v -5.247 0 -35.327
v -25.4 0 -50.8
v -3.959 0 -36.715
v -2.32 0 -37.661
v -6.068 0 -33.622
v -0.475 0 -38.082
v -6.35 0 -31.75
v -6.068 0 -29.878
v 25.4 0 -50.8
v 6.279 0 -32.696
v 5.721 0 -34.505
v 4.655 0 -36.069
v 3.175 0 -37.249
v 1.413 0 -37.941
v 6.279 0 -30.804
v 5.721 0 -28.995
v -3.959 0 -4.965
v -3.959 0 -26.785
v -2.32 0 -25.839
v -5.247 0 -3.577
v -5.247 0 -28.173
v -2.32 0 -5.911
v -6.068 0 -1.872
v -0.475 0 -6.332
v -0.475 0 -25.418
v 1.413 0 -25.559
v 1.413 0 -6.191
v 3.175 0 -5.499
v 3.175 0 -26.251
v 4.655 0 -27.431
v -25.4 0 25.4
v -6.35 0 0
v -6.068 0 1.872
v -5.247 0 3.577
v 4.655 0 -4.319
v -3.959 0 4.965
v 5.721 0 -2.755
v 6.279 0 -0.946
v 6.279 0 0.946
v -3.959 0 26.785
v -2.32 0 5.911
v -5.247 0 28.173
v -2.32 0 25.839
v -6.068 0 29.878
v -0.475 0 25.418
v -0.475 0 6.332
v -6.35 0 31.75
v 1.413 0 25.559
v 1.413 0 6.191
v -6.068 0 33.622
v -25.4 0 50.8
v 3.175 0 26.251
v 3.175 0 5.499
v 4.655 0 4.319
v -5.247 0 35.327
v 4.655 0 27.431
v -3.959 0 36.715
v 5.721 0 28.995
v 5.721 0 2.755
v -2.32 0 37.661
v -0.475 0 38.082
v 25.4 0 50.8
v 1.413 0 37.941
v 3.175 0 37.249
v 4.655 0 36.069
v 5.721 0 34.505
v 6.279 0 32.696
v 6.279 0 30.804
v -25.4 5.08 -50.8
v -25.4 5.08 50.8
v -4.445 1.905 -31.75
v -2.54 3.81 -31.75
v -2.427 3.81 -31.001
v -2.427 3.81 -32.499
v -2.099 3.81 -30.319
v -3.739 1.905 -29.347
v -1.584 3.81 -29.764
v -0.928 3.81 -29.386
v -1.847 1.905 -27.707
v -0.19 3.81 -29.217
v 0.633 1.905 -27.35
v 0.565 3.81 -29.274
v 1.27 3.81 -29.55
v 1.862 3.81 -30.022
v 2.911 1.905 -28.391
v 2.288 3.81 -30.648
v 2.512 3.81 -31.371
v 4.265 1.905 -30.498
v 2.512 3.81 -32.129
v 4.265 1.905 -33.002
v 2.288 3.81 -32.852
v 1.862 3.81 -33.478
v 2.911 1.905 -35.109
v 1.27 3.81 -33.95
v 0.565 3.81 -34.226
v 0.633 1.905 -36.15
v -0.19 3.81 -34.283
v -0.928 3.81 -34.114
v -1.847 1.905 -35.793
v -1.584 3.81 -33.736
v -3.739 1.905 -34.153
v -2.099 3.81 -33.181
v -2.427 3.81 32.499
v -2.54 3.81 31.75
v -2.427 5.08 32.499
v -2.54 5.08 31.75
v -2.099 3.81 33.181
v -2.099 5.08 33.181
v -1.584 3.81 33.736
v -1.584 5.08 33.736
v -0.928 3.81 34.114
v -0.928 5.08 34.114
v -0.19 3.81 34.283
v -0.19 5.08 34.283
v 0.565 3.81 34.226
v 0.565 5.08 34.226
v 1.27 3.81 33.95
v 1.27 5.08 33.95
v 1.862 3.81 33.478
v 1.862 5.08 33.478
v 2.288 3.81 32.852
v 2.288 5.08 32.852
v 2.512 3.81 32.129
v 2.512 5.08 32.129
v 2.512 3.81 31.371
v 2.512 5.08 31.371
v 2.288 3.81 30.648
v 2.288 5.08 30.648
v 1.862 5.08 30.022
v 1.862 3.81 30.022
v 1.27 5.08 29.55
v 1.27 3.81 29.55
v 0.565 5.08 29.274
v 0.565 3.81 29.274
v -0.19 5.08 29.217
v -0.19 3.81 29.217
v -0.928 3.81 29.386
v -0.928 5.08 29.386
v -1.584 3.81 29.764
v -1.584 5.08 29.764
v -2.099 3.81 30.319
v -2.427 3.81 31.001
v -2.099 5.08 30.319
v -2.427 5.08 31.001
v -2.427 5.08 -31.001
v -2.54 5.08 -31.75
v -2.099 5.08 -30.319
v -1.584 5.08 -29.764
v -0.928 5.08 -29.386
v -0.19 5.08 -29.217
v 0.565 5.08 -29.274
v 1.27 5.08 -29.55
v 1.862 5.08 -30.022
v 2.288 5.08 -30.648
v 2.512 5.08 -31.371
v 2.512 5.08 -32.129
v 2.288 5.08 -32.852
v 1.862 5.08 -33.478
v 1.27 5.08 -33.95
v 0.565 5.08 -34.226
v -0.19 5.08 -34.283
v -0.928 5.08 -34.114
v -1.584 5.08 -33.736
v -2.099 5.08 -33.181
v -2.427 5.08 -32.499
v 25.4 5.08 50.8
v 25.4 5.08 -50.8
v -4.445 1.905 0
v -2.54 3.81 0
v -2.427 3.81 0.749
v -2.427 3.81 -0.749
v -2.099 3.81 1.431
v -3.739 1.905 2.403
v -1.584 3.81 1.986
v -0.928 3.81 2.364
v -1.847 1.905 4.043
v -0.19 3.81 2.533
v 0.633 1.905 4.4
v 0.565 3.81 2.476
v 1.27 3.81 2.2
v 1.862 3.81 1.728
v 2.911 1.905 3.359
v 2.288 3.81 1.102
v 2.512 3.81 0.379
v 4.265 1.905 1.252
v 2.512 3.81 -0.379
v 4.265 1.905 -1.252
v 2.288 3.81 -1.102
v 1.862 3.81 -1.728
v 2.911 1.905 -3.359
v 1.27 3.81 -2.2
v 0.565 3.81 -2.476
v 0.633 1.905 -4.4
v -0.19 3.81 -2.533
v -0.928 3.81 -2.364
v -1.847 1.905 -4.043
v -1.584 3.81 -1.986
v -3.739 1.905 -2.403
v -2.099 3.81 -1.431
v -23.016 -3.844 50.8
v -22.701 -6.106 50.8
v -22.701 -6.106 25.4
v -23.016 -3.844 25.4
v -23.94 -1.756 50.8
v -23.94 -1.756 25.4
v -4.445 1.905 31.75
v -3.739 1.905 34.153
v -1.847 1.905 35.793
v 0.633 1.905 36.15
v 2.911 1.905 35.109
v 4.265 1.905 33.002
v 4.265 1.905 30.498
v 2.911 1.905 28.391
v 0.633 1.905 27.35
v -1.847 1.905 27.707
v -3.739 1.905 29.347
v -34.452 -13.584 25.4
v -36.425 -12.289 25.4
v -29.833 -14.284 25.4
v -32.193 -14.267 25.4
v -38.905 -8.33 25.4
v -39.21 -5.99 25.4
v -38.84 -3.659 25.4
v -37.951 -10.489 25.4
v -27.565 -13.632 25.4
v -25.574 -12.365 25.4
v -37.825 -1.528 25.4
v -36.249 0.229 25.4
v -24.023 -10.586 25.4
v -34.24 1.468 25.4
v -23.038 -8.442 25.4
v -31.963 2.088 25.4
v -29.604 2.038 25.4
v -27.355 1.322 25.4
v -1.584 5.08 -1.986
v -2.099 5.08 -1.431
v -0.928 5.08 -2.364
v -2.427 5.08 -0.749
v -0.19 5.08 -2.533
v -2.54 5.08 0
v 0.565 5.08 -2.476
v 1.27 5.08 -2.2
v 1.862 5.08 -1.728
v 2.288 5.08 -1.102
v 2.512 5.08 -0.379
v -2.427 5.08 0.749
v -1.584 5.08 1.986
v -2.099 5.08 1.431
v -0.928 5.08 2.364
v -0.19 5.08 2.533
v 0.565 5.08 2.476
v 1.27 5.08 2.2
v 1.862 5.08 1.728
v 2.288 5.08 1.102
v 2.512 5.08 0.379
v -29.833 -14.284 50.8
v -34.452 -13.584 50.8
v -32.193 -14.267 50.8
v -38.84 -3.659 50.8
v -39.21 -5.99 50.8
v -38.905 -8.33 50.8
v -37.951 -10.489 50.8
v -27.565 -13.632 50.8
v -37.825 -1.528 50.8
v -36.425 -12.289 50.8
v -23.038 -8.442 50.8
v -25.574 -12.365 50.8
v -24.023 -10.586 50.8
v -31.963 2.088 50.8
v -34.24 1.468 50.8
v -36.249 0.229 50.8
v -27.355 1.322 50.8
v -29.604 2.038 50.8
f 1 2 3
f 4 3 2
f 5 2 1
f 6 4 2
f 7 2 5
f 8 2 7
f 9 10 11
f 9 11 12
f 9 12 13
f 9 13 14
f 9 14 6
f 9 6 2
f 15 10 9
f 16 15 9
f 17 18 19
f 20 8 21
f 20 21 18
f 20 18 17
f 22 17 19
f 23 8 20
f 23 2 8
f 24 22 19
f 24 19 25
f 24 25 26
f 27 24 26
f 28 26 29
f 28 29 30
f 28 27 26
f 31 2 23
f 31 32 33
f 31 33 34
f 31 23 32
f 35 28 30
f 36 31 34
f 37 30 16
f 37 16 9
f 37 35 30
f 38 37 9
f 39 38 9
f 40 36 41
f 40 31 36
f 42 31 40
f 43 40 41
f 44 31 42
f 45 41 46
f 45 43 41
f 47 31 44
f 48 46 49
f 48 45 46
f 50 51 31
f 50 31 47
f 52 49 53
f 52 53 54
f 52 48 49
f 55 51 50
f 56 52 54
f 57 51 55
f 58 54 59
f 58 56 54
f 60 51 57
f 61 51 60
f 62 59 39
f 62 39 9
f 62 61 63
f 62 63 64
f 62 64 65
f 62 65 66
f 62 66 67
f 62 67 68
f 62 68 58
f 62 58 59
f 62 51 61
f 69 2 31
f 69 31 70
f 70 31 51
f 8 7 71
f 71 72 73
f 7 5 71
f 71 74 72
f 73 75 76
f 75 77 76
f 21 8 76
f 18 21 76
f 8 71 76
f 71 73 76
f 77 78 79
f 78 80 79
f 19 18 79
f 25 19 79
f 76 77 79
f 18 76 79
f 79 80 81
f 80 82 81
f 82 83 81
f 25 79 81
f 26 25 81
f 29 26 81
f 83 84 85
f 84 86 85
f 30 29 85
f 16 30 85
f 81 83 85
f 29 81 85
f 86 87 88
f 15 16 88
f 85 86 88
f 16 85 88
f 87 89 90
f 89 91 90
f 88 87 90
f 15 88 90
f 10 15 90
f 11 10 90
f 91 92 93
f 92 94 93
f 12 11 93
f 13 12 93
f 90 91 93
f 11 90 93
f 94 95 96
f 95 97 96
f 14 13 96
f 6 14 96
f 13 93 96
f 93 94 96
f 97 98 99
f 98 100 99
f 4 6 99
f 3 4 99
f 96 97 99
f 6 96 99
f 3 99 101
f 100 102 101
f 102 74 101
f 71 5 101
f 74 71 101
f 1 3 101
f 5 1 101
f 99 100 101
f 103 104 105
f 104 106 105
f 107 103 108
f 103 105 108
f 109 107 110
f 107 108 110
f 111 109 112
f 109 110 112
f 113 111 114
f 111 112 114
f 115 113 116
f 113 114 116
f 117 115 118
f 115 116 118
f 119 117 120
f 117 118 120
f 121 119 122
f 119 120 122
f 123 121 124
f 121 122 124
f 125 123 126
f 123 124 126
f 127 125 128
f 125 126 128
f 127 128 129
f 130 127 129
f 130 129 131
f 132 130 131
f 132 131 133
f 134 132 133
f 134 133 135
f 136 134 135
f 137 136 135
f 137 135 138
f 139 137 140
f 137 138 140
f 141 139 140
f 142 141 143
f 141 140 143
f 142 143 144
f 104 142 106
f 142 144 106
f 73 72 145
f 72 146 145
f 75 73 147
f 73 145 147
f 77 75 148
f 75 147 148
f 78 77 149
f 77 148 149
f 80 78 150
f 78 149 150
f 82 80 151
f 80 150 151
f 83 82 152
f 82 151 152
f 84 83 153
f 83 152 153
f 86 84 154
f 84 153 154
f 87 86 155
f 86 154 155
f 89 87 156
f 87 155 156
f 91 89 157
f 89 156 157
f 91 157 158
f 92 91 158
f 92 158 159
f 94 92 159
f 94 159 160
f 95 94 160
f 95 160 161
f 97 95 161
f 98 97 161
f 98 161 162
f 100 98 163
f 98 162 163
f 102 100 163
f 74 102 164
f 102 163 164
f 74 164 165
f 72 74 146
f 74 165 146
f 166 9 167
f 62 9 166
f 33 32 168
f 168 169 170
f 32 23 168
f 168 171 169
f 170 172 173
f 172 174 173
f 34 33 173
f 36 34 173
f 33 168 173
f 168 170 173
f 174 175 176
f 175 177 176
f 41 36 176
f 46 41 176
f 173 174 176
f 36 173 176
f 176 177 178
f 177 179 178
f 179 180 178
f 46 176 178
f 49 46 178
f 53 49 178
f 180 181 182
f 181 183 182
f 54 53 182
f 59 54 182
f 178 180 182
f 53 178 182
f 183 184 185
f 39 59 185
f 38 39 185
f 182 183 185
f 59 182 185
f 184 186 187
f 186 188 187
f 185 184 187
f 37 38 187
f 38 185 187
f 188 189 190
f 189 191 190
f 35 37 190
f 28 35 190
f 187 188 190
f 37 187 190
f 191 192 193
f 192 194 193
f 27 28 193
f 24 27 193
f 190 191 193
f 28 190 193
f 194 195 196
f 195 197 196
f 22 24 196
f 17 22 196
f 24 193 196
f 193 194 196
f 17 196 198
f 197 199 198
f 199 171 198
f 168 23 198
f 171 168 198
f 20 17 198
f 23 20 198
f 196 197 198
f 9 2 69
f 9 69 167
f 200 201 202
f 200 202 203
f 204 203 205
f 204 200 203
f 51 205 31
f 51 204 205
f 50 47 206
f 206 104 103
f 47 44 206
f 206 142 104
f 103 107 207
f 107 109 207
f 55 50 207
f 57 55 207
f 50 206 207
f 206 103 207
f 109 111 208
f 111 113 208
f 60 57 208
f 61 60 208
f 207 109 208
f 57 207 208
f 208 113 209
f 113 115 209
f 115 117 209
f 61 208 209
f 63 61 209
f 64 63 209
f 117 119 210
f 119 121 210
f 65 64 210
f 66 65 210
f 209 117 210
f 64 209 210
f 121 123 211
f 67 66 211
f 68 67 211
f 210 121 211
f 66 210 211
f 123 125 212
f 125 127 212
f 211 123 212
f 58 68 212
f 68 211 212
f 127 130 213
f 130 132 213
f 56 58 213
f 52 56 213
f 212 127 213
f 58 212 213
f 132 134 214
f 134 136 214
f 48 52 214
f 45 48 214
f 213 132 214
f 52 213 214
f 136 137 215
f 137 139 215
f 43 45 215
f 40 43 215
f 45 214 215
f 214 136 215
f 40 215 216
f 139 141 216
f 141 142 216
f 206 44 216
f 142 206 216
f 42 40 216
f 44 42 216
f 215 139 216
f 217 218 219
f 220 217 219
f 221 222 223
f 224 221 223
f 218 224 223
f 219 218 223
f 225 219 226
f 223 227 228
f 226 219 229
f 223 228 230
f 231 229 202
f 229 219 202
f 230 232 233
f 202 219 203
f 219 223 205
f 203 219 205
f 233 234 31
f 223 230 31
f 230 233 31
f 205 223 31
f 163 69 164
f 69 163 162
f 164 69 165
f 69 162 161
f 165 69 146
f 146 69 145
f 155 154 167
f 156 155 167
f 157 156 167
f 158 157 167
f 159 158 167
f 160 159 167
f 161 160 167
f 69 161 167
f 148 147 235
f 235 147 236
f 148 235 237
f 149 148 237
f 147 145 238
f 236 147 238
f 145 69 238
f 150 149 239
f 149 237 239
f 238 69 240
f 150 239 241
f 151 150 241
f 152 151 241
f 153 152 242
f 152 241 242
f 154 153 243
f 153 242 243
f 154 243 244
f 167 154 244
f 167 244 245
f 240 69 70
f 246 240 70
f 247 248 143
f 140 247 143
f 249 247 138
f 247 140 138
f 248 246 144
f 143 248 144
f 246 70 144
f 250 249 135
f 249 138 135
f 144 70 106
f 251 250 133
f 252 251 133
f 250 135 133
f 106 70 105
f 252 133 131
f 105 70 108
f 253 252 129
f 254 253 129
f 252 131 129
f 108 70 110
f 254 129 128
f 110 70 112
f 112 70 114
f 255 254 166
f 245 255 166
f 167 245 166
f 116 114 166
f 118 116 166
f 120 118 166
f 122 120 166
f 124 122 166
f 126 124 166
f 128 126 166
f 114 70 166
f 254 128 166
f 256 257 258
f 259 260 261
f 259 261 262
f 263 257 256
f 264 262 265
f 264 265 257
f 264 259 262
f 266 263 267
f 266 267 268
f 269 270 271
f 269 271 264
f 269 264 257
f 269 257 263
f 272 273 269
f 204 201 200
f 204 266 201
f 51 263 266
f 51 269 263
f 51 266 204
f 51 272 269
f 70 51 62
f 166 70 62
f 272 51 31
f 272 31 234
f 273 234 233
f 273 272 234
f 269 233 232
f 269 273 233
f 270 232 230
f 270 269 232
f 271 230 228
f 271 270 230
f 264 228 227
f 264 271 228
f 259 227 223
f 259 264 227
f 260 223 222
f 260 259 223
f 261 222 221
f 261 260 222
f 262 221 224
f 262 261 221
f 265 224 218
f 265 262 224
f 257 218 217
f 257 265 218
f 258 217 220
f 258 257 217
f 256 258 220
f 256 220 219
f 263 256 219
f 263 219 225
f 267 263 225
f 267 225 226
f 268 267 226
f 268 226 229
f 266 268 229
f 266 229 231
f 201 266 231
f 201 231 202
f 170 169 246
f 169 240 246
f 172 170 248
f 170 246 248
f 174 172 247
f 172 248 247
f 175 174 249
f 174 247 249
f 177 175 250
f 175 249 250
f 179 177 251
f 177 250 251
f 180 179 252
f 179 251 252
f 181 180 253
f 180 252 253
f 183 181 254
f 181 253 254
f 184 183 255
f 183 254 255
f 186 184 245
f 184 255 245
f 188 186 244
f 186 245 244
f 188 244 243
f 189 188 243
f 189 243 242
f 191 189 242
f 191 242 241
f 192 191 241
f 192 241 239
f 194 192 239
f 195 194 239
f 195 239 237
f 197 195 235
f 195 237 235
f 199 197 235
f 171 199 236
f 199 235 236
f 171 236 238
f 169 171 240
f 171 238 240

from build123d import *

# Parameters (mm, degrees)
F0_W           = 50.8
F0_H           = 101.6
F1_DEPTH       = 5.08
F3_D           = 5.08
F3_CSINK_D     = 12.7
F3_CSINK_ANGLE = 90
F4_R           = 8.255
F5_DEPTH       = 25.4


with BuildPart() as f1:
    # F0 (on Front) → F1 (new body)
    with BuildSketch(Plane.XZ):
        Rectangle(F0_W, F0_H)
    extrude(amount=-F1_DEPTH)

    # F3 (through all)
    with Locations(Plane.XZ):
        with Locations((0, 31.75), (0, -31.75), (0, 0)):
            CounterSinkHole(F3_D / 2, F3_CSINK_D / 2, counter_sink_angle=F3_CSINK_ANGLE)

    # F4 (on face) → F5 (join)
    with BuildSketch(Plane.XY.offset(50.8)):
        with Locations((-30.955659, -6.105709)):
            Circle(F4_R)
    extrude(amount=-F5_DEPTH)


solid = f1.part
